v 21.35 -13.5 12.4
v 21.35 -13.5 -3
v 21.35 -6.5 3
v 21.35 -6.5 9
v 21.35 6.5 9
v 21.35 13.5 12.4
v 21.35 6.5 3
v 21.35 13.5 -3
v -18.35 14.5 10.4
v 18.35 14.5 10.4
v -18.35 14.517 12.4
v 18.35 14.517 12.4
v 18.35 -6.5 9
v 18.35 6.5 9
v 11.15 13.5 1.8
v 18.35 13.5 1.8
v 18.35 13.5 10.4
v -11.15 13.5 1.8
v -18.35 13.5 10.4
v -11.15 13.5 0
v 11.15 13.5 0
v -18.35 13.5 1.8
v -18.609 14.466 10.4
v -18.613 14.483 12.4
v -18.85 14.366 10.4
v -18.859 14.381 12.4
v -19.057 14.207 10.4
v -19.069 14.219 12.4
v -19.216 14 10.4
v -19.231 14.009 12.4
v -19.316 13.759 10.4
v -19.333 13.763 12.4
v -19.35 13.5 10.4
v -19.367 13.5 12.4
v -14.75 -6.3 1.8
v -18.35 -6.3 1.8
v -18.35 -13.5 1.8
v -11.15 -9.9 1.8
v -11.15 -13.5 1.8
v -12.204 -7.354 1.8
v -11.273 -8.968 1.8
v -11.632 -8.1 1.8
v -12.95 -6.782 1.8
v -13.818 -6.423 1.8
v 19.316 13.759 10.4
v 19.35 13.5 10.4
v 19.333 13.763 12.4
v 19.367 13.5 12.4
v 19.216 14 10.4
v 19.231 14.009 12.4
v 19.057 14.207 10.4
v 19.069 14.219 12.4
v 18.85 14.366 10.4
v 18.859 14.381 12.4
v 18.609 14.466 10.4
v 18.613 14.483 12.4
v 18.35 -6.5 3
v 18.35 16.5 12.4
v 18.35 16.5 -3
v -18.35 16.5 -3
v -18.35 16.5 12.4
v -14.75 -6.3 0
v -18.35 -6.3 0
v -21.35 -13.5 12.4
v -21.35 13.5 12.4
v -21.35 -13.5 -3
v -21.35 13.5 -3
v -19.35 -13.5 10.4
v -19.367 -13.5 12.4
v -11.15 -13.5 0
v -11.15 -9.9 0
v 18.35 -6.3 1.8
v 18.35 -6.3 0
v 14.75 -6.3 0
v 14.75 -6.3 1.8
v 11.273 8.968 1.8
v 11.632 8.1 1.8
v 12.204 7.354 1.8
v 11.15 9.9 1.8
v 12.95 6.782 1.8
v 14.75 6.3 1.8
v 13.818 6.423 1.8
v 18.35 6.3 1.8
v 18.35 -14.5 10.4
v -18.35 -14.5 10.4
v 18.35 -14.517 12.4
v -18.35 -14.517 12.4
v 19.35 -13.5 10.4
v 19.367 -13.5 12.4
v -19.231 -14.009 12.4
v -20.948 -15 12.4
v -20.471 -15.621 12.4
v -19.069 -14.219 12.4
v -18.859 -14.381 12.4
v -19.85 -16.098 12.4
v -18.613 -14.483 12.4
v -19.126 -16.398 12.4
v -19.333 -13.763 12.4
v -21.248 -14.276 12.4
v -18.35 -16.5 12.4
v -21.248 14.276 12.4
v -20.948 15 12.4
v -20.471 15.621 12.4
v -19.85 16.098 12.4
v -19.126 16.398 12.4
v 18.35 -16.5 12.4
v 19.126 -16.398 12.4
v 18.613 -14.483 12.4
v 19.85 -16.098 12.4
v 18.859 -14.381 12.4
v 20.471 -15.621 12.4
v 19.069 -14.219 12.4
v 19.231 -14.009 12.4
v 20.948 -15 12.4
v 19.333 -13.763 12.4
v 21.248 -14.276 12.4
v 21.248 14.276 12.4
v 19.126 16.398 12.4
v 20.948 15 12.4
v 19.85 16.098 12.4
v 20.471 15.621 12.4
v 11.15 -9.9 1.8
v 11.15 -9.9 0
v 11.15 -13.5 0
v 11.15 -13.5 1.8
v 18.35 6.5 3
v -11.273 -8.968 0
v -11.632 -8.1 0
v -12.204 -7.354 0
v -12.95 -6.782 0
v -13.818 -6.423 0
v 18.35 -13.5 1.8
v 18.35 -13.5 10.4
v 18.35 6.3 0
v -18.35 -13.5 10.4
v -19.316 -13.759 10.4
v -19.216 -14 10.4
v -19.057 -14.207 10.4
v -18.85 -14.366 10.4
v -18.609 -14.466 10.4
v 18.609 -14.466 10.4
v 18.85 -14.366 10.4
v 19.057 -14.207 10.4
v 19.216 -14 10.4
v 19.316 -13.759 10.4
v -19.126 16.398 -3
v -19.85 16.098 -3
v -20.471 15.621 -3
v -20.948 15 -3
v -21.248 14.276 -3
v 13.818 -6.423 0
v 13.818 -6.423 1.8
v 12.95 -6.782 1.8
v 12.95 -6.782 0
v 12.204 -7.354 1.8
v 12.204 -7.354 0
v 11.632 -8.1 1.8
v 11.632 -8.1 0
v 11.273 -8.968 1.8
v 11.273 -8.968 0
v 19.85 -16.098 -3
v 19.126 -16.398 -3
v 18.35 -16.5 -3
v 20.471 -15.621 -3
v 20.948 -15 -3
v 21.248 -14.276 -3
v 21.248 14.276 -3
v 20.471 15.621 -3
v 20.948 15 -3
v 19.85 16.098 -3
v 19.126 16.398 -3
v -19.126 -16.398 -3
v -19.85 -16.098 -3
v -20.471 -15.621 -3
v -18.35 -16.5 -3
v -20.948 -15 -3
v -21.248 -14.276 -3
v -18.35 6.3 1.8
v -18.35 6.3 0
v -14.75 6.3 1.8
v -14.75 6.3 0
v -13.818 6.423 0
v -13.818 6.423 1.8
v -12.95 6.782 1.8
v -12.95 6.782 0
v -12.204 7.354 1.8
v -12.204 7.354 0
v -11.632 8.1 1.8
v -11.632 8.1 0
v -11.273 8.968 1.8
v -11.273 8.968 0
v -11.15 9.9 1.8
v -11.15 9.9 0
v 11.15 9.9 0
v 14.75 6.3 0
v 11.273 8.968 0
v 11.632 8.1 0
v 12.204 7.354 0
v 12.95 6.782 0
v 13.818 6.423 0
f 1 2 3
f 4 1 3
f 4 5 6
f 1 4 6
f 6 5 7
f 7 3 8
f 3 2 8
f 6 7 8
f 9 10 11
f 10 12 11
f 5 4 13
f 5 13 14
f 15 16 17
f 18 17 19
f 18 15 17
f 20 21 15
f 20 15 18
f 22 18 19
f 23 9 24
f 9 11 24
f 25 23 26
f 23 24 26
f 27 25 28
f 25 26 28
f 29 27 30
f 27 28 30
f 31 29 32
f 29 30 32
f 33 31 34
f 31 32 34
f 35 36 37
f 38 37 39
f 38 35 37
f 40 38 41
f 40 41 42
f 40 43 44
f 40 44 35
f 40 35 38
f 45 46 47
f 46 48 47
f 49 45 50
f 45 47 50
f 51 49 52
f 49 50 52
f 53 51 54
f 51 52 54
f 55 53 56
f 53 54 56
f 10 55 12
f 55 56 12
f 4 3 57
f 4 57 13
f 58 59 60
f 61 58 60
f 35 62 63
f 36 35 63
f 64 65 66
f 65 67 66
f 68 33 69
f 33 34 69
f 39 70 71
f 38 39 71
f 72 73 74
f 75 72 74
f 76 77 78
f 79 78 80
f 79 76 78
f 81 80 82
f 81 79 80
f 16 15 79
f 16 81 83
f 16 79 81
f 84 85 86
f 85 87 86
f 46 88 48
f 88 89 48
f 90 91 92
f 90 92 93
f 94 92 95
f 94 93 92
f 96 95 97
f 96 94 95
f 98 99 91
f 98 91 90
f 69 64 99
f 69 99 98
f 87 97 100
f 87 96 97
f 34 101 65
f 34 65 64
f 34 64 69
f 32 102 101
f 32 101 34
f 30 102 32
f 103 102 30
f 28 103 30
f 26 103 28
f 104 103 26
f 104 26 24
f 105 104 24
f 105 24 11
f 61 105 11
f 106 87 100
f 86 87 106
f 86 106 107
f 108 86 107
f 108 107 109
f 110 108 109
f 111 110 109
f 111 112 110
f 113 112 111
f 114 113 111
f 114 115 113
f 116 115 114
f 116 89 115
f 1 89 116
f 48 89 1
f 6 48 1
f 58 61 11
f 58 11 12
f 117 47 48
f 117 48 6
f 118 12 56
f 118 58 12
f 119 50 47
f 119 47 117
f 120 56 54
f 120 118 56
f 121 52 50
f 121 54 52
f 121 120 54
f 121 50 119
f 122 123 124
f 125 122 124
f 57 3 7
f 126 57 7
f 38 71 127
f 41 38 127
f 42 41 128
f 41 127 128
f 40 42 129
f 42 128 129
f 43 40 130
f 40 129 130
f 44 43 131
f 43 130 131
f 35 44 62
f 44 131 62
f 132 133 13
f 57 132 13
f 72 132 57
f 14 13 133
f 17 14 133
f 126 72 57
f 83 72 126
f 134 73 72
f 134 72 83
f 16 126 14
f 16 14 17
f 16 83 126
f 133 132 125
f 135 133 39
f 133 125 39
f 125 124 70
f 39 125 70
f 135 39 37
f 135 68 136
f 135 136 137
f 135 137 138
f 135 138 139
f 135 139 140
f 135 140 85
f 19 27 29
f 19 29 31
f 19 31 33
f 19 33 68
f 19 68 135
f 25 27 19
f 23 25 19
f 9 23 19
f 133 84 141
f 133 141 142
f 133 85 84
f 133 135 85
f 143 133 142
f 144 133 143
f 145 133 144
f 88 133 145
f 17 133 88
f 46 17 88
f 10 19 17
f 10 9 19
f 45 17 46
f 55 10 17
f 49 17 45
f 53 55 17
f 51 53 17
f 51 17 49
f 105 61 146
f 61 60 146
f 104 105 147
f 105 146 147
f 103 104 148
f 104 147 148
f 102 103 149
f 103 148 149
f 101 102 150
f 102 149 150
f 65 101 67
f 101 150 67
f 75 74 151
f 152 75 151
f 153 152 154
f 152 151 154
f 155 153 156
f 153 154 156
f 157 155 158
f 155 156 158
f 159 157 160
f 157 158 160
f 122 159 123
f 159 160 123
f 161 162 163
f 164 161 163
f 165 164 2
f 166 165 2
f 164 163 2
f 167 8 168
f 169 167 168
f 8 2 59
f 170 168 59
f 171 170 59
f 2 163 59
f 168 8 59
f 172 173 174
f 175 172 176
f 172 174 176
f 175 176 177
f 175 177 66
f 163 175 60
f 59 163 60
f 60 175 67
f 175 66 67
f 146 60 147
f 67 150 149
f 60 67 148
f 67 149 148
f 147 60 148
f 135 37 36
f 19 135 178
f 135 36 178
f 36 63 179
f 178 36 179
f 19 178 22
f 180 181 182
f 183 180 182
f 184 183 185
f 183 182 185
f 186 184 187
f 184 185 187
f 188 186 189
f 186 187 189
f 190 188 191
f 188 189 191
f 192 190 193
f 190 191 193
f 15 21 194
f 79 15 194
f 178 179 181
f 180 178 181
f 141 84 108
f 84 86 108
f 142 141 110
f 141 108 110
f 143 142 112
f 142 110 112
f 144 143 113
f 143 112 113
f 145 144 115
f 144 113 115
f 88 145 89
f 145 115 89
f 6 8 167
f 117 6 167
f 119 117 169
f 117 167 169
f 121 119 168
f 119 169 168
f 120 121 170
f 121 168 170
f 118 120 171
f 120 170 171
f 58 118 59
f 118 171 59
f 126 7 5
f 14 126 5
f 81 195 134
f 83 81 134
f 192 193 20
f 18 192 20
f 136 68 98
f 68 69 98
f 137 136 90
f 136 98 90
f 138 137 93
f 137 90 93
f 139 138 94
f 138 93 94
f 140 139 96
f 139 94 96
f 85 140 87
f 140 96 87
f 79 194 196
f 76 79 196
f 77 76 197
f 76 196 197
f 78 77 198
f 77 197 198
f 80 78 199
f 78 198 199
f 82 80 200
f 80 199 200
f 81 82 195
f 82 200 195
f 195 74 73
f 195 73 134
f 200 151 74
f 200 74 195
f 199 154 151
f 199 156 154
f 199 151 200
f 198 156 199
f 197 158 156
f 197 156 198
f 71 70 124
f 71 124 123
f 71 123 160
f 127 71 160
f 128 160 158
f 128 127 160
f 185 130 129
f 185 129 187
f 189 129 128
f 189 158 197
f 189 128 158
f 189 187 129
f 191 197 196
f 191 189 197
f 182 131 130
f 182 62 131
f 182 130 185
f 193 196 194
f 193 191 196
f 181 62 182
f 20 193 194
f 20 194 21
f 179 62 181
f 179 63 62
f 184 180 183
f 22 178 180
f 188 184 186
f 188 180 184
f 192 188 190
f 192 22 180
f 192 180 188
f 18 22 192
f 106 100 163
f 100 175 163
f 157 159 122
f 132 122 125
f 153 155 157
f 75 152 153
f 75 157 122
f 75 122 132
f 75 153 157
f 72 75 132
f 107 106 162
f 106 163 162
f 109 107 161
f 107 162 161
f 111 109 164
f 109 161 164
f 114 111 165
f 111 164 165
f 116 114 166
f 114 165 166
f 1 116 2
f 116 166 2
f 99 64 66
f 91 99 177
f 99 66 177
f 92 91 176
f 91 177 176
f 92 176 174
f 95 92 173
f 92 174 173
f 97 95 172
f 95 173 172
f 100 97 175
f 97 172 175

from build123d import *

# Parameters (mm, degrees)
SKETCH1_W           = 27
SKETCH1_H           = 36.7
BOSS_EXTRUDE1_DEPTH = 10.4
SHELL1_T            = 3
BOSS_EXTRUDE2_DEPTH = 1.8
CUT_EXTRUDE1_REACH  = 48.944
SKETCH3_W           = 13
SKETCH3_H           = 6
FILLET1_R           = 3
LIP2_START          = 10.4
LIP2_DEPTH          = 2


with BuildPart() as part:
    # Sketch1 → Boss-Extrude1 (new body)
    with BuildSketch(Plane(origin=(0, 0, 0), x_dir=(0, 1, 0), z_dir=(0, 0, 1))):
        Rectangle(SKETCH1_W, SKETCH1_H)
    extrude(amount=BOSS_EXTRUDE1_DEPTH)

    # Shell1
    shell1_openings = [part.faces().sort_by_distance(p)[0] for p in [
        (0, 0, 10.4),
    ]]
    offset(amount=SHELL1_T, openings=shell1_openings, kind=Kind.INTERSECTION)

    # Sketch2 → Boss-Extrude2 (add)
    with BuildSketch(Plane.XY):
        with BuildLine():
            Line((-11.15, 9.9), (-11.15, 13.5))
            Line((-11.15, 13.5), (-18.35, 13.5))
            Line((-18.35, 13.5), (-18.35, 6.3))
            Line((-18.35, 6.3), (-14.75, 6.3))
            ThreePointArc((-14.75, 6.3), (-12.204415588, 7.354415588), (-11.15, 9.9))
        make_face()
        with BuildLine():
            Line((18.35, 13.5), (11.15, 13.5))
            Line((11.15, 13.5), (11.15, 9.9))
            ThreePointArc((11.15, 9.9), (12.204415588, 7.354415588), (14.75, 6.3))
            Line((14.75, 6.3), (18.35, 6.3))
            Line((18.35, 6.3), (18.35, 13.5))
        make_face()
        with BuildLine():
            Line((18.35, -13.5), (18.35, -6.3))
            Line((18.35, -6.3), (14.75, -6.3))
            ThreePointArc((14.75, -6.3), (12.204415588, -7.354415588), (11.15, -9.9))
            Line((11.15, -9.9), (11.15, -13.5))
            Line((11.15, -13.5), (18.35, -13.5))
        make_face()
        with BuildLine():
            Line((-14.75, -6.3), (-18.35, -6.3))
            Line((-18.35, -6.3), (-18.35, -13.5))
            Line((-18.35, -13.5), (-11.15, -13.5))
            Line((-11.15, -13.5), (-11.15, -9.9))
            ThreePointArc((-11.15, -9.9), (-12.204415588, -7.354415588), (-14.75, -6.3))
        make_face()
    extrude(amount=BOSS_EXTRUDE2_DEPTH)

    # Sketch3 → Cut-Extrude1 (cut, up to next)
    with BuildSketch(Plane.YZ.offset(21.35), mode=Mode.PRIVATE) as cut_extrude1_sk1:
        with Locations((0, 6)):
            Rectangle(SKETCH3_W, SKETCH3_H)
    cut_extrude1_tool1 = extrude(cut_extrude1_sk1.sketch, amount=-CUT_EXTRUDE1_REACH, mode=Mode.PRIVATE) & part.part
    add(cut_extrude1_tool1.solids().sort_by_distance((21.35, 0, 6))[0], mode=Mode.SUBTRACT)

    # Fillet1
    fillet1_edges = [part.edges().sort_by_distance(p)[0] for p in [
        (21.35, 16.5, 3.7),
        (21.35, -16.5, 3.7),
        (-21.35, -16.5, 3.7),
        (-21.35, 16.5, 3.7),
    ]]
    fillet(fillet1_edges, radius=FILLET1_R)

    # Lip2: read off the stored shape, not the designer's step
    # Lip2 outline → Lip2 (add)
    with BuildSketch(Plane.XY.offset(LIP2_START)):
        with BuildLine():
            Line((18.35, 16.5), (-18.35, 16.5))
            ThreePointArc((-18.35, 16.5), (-20.471320344, 15.621320344), (-21.35, 13.5))
            Line((-21.35, 13.5), (-21.35, -13.5))
            ThreePointArc((-21.35, -13.5), (-20.471320344, -15.621320344), (-18.35, -16.5))
            Line((-18.35, -16.5), (18.35, -16.5))
            ThreePointArc((18.35, -16.5), (20.471320344, -15.621320344), (21.35, -13.5))
            Line((21.35, -13.5), (21.35, 13.5))
            ThreePointArc((21.35, 13.5), (20.471320344, 15.621320344), (18.35, 16.5))
        make_face()
    extrude(amount=LIP2_DEPTH)

    # Lip2 2: loft between two sections, ruled curve by curve
    lip2_2_from = [
        Edge.make_three_point_arc((18.35, -14.5, 10.4), (19.057106781, -14.207106781, 10.4), (19.35, -13.5, 10.4)),
        Edge.make_three_point_arc((-19.35, -13.5, 10.4), (-19.057106781, -14.207106781, 10.4), (-18.35, -14.5, 10.4)),
        Edge.make_three_point_arc((-18.35, 14.5, 10.4), (-19.057106781, 14.207106781, 10.4), (-19.35, 13.5, 10.4)),
        Edge.make_three_point_arc((19.35, 13.5, 10.4), (19.057106781, 14.207106781, 10.4), (18.35, 14.5, 10.4)),
        Edge.make_line((19.35, -13.5, 10.4), (19.35, 13.5, 10.4)),
        Edge.make_line((-18.35, -14.5, 10.4), (18.35, -14.5, 10.4)),
        Edge.make_line((-19.35, 13.5, 10.4), (-19.35, -13.5, 10.4)),
        Edge.make_line((18.35, 14.5, 10.4), (-18.35, 14.5, 10.4)),
    ]
    lip2_2_to = [
        Edge.make_three_point_arc((18.35, -14.517453736, 12.4), (19.069448436, -14.219448436, 12.4), (19.367453736, -13.5, 12.4)),
        Edge.make_three_point_arc((-19.367453736, -13.5, 12.4), (-19.069448436, -14.219448436, 12.4), (-18.35, -14.517453736, 12.4)),
        Edge.make_three_point_arc((-18.35, 14.517453736, 12.4), (-19.069448436, 14.219448436, 12.4), (-19.367453736, 13.5, 12.4)),
        Edge.make_three_point_arc((19.367453736, 13.5, 12.4), (19.069448436, 14.219448436, 12.4), (18.35, 14.517453736, 12.4)),
        Edge.make_line((19.367453736, -13.5, 12.4), (19.367453736, 13.5, 12.4)),
        Edge.make_line((-18.35, -14.517453736, 12.4), (18.35, -14.517453736, 12.4)),
        Edge.make_line((-19.367453736, 13.5, 12.4), (-19.367453736, -13.5, 12.4)),
        Edge.make_line((18.35, 14.517453736, 12.4), (-18.35, 14.517453736, 12.4)),
    ]
    lip2_2 = Solid(Shell([*[Face.make_surface_from_curves(lip2_2_from[k], lip2_2_to[k]) for k in range(8)], Face(Wire(lip2_2_from)), Face(Wire(lip2_2_to))]))
    add(lip2_2, mode=Mode.SUBTRACT)


solid = part.part
